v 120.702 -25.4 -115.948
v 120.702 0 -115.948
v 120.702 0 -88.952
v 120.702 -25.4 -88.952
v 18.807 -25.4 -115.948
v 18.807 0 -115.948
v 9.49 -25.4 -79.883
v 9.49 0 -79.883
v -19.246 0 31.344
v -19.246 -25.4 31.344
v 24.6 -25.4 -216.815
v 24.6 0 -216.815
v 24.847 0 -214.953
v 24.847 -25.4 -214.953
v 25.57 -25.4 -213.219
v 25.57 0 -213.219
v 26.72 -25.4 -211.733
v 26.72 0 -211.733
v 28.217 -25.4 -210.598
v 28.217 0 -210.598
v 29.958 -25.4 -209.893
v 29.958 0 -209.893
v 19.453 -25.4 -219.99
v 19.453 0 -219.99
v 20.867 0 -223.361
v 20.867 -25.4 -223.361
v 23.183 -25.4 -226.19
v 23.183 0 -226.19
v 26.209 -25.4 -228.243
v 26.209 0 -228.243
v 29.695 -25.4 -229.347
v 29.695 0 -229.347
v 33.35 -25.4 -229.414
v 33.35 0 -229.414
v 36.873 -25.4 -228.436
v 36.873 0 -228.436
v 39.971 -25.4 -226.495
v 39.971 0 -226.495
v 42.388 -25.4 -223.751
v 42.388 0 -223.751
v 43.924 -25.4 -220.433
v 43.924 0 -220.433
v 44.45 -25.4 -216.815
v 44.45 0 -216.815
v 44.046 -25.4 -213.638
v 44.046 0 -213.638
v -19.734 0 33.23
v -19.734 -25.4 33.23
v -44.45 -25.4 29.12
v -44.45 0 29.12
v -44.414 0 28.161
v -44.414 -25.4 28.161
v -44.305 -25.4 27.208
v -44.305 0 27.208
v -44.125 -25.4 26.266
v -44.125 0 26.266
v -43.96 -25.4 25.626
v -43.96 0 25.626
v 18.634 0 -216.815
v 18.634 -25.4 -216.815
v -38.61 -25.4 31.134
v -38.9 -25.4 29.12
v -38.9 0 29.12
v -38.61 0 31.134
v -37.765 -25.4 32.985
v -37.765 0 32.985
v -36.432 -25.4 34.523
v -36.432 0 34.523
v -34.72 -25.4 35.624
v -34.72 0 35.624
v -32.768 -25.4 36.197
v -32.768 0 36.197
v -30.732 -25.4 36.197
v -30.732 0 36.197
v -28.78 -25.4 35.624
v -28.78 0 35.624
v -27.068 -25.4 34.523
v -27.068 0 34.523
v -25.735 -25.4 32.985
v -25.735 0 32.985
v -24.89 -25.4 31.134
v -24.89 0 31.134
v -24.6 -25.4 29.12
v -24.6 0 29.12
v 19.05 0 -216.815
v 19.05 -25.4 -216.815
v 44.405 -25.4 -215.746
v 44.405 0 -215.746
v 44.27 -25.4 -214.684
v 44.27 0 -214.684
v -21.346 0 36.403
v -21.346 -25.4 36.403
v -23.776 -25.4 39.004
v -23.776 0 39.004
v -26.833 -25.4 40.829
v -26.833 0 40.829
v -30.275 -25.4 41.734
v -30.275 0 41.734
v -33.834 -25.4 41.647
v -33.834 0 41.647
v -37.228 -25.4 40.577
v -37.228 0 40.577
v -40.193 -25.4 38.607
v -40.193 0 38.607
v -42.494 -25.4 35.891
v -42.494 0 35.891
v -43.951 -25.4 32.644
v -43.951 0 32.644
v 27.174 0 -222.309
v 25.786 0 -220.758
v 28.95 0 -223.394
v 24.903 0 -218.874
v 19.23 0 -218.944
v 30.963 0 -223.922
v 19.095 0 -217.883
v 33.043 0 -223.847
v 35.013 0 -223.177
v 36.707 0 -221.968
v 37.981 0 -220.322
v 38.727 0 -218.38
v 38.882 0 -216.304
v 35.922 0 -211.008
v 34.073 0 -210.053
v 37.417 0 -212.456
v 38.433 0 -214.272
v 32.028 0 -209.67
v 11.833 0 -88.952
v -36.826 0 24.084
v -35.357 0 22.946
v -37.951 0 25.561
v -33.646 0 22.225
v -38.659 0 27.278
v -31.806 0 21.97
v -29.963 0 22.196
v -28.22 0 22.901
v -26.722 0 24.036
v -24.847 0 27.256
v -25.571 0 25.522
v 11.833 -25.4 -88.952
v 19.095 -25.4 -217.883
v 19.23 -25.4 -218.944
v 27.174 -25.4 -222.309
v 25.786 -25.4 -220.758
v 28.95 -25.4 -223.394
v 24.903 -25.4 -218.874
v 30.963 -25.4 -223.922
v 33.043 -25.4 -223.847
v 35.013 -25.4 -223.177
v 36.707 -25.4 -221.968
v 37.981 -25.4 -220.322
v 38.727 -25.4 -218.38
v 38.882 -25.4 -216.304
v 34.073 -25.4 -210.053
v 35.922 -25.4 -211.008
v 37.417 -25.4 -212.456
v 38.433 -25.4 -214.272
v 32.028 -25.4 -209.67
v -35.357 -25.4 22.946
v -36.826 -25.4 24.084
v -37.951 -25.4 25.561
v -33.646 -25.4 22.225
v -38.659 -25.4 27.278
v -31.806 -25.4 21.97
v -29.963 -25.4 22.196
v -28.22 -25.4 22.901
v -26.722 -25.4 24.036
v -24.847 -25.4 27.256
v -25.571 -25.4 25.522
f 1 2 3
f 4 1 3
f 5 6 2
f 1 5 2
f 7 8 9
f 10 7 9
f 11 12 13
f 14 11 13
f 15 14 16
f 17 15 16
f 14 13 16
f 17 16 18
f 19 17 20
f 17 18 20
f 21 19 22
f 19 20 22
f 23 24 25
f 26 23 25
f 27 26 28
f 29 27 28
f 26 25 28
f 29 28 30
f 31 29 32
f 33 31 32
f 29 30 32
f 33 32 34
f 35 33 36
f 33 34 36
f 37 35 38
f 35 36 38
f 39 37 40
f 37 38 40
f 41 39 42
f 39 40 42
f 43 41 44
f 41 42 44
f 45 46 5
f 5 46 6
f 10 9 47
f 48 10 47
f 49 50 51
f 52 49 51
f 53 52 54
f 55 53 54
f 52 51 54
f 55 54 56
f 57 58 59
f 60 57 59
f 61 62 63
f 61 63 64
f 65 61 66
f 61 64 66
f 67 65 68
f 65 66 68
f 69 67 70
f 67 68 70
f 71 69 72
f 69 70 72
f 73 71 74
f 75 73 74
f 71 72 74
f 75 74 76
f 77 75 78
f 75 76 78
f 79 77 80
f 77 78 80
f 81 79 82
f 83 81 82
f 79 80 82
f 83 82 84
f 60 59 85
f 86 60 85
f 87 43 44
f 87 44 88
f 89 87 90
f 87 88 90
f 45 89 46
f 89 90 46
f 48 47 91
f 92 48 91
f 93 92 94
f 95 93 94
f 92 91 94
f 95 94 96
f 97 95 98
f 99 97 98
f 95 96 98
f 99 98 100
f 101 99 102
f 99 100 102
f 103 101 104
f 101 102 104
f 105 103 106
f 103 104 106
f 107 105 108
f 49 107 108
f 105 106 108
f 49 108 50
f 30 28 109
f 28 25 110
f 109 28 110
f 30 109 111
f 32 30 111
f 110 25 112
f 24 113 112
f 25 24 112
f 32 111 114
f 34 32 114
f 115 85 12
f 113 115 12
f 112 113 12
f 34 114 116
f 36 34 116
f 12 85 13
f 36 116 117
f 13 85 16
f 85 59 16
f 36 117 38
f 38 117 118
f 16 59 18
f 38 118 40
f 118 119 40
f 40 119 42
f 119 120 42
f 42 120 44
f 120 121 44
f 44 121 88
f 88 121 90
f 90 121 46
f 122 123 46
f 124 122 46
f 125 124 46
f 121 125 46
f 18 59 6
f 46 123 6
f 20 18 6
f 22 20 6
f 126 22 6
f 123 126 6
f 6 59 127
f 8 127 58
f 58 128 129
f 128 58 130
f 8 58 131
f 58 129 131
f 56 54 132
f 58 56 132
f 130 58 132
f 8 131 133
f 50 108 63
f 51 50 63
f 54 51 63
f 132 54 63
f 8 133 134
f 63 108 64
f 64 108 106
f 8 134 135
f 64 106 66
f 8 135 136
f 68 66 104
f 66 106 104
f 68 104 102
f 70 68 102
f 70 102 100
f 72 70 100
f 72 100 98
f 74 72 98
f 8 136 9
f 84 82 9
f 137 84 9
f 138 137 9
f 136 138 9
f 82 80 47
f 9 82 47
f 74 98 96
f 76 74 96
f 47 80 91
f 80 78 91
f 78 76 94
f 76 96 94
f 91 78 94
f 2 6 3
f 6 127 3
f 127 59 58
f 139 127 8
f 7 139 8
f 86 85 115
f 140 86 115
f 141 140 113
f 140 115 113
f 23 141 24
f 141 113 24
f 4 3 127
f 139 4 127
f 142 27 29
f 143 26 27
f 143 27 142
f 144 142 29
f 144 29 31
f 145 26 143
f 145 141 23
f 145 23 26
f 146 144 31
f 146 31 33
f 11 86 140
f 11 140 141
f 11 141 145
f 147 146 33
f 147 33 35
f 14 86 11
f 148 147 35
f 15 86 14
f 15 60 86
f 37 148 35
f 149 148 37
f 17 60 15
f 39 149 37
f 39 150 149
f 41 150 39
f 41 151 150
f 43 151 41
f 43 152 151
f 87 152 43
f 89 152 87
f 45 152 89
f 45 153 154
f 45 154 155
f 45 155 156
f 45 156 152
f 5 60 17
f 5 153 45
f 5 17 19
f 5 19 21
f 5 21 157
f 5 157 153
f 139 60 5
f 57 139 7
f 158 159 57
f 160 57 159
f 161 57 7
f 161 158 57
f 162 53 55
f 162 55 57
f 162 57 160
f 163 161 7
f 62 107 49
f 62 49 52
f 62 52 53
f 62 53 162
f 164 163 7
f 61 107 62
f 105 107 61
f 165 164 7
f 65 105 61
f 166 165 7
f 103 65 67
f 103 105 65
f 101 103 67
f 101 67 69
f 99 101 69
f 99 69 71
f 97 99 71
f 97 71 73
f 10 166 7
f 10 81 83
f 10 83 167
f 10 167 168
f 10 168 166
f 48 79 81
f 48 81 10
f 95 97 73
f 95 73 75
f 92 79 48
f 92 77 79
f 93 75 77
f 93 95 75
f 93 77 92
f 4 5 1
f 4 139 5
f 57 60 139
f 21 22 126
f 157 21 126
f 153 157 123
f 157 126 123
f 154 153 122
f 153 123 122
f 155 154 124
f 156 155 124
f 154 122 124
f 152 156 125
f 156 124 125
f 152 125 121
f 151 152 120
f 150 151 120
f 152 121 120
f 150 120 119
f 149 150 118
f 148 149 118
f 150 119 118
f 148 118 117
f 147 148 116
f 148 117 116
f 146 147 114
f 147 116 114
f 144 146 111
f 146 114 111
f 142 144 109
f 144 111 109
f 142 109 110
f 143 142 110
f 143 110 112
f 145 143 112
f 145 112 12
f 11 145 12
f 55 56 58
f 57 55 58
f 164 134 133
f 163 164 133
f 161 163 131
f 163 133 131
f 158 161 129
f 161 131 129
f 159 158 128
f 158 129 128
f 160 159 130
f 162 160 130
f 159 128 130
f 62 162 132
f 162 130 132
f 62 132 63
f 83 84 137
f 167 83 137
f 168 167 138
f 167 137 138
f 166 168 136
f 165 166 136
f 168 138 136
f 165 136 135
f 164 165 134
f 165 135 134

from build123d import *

# Parameters (mm, degrees)
F1_DEPTH = 25.4


# Not quite as in the source:
# - a feature names something its author has since deleted; it is built from what else it names


with BuildPart() as f1:
    # F0 (on Front) → F1 (new body)
    with BuildSketch(Plane.XZ):
        with BuildLine():
            ThreePointArc((-38.9001, 29.1195621888), (-31.75, 36.2696621888), (-24.5999, 29.1195621888))
            ThreePointArc((-24.5999, 29.1195621888), (-26.0973866941, 24.7409901814), (-29.9625922208, 22.1964773676))
            Line((-29.9625922208, 22.1964773676), (-28.5752082075, 16.8227863075))
            ThreePointArc((-28.5752082075, 16.8227863075), (-21.7098342702, 21.3423472555), (-19.05, 29.1195621888))
            ThreePointArc((-19.05, 29.1195621888), (-19.0991685805, 30.2360138876), (-19.2462936057, 31.3438208077))
            Line((-19.2462936057, 31.3438208077), (-19.7336528982, 33.2302071905))
            ThreePointArc((-19.7336528982, 33.2302071905), (-33.8335536719, 41.6474831694), (-44.45, 29.1195621888))
            Line((-44.45, 29.1195621888), (-38.9001, 29.1195621888))
        make_face()
        with BuildLine():
            ThreePointArc((-29.9625922208, 22.1964773676), (-36.1285720074, 23.4669488829), (-38.9001, 29.1195621888))
            Line((-38.9001, 29.1195621888), (-44.45, 29.1195621888))
            ThreePointArc((-44.45, 29.1195621888), (-44.3685455909, 27.683488663), (-44.1252272171, 26.2658363215))
            Line((-44.1252272171, 26.2658363215), (-43.9599962271, 25.6258546831))
            ThreePointArc((-43.9599962271, 25.6258546831), (-38.0573158317, 18.0965060336), (-28.5752082075, 16.8227863075))
            Line((-28.5752082075, 16.8227863075), (-29.9625922208, 22.1964773676))
        make_face()
        with BuildLine():
            Line((28.5710442304, -204.5191802253), (-28.5752082075, 16.8227863075))
            ThreePointArc((-28.5752082075, 16.8227863075), (-38.0573158317, 18.0965060336), (-43.9599962271, 25.6258546831))
            Line((-43.9599962271, 25.6258546831), (18.6335537415, -216.8148802954))
            Line((18.6335537415, -216.8148802954), (19.05, -216.8148802954))
            ThreePointArc((19.05, -216.8148802954), (21.7085175827, -209.039365466), (28.5710442304, -204.5191802253))
        make_face()
        with BuildLine():
            ThreePointArc((-19.05, 29.1195621888), (-21.7098342702, 21.3423472555), (-28.5752082075, 16.8227863075))
            Line((-28.5752082075, 16.8227863075), (28.5710442304, -204.5191802253))
            ThreePointArc((28.5710442304, -204.5191802253), (38.1974658289, -205.8732083763), (44.0462542776, -213.6380688845))
            Line((44.0462542776, -213.6380688845), (18.8073706418, -115.9477465067))
            Line((18.8073706418, -115.9477465067), (11.8328057084, -88.9518022083))
            Line((11.8328057084, -88.9518022083), (9.4897628664, -79.8827556578))
            Line((9.4897628664, -79.8827556578), (-19.2462936057, 31.3438208077))
            ThreePointArc((-19.2462936057, 31.3438208077), (-19.0991685805, 30.2360138876), (-19.05, 29.1195621888))
        make_face()
        with BuildLine():
            Line((29.958428385, -209.8928718327), (28.5710442304, -204.5191802253))
            ThreePointArc((28.5710442304, -204.5191802253), (21.7085175827, -209.039365466), (19.05, -216.8148802954))
            Line((19.05, -216.8148802954), (24.5999, -216.8148802954))
            ThreePointArc((24.5999, -216.8148802954), (26.0960701183, -212.4380084784), (29.958428385, -209.8928718327))
        make_face()
        with BuildLine():
            ThreePointArc((44.0462542776, -213.6380688845), (38.1974658289, -205.8732083763), (28.5710442304, -204.5191802253))
            Line((28.5710442304, -204.5191802253), (29.958428385, -209.8928718327))
            ThreePointArc((29.958428385, -209.8928718327), (36.126871817, -211.1609504137), (38.9001, -216.8148802954))
            ThreePointArc((38.9001, -216.8148802954), (37.4012962188, -221.1951520972), (33.5332432967, -223.7390389703))
            Line((33.5332432967, -223.7390389703), (34.9206274513, -229.1127305777))
            ThreePointArc((34.9206274513, -229.1127305777), (41.7888487545, -224.5937951095), (44.45, -216.8148802954))
            ThreePointArc((44.45, -216.8148802954), (44.3486592407, -215.2136978145), (44.0462542776, -213.6380688845))
        make_face()
        with BuildLine():
            Line((24.5999, -216.8148802954), (19.05, -216.8148802954))
            ThreePointArc((19.05, -216.8148802954), (19.1512093102, -218.4150281492), (19.4532241187, -219.9896720879))
            ThreePointArc((19.4532241187, -219.9896720879), (25.2979309254, -227.7538384111), (34.9206274513, -229.1127305777))
            Line((34.9206274513, -229.1127305777), (33.5332432967, -223.7390389703))
            ThreePointArc((33.5332432967, -223.7390389703), (27.3697281982, -222.4661765142), (24.5999, -216.8148802954))
        make_face()
        Polygon((11.8328057084, -88.9518022083), (18.8073706418, -115.9477465067), (120.7016461253, -115.9477465067), (120.7016461253, -88.9518022083), align=None)
    extrude(amount=F1_DEPTH)


solid = f1.part
